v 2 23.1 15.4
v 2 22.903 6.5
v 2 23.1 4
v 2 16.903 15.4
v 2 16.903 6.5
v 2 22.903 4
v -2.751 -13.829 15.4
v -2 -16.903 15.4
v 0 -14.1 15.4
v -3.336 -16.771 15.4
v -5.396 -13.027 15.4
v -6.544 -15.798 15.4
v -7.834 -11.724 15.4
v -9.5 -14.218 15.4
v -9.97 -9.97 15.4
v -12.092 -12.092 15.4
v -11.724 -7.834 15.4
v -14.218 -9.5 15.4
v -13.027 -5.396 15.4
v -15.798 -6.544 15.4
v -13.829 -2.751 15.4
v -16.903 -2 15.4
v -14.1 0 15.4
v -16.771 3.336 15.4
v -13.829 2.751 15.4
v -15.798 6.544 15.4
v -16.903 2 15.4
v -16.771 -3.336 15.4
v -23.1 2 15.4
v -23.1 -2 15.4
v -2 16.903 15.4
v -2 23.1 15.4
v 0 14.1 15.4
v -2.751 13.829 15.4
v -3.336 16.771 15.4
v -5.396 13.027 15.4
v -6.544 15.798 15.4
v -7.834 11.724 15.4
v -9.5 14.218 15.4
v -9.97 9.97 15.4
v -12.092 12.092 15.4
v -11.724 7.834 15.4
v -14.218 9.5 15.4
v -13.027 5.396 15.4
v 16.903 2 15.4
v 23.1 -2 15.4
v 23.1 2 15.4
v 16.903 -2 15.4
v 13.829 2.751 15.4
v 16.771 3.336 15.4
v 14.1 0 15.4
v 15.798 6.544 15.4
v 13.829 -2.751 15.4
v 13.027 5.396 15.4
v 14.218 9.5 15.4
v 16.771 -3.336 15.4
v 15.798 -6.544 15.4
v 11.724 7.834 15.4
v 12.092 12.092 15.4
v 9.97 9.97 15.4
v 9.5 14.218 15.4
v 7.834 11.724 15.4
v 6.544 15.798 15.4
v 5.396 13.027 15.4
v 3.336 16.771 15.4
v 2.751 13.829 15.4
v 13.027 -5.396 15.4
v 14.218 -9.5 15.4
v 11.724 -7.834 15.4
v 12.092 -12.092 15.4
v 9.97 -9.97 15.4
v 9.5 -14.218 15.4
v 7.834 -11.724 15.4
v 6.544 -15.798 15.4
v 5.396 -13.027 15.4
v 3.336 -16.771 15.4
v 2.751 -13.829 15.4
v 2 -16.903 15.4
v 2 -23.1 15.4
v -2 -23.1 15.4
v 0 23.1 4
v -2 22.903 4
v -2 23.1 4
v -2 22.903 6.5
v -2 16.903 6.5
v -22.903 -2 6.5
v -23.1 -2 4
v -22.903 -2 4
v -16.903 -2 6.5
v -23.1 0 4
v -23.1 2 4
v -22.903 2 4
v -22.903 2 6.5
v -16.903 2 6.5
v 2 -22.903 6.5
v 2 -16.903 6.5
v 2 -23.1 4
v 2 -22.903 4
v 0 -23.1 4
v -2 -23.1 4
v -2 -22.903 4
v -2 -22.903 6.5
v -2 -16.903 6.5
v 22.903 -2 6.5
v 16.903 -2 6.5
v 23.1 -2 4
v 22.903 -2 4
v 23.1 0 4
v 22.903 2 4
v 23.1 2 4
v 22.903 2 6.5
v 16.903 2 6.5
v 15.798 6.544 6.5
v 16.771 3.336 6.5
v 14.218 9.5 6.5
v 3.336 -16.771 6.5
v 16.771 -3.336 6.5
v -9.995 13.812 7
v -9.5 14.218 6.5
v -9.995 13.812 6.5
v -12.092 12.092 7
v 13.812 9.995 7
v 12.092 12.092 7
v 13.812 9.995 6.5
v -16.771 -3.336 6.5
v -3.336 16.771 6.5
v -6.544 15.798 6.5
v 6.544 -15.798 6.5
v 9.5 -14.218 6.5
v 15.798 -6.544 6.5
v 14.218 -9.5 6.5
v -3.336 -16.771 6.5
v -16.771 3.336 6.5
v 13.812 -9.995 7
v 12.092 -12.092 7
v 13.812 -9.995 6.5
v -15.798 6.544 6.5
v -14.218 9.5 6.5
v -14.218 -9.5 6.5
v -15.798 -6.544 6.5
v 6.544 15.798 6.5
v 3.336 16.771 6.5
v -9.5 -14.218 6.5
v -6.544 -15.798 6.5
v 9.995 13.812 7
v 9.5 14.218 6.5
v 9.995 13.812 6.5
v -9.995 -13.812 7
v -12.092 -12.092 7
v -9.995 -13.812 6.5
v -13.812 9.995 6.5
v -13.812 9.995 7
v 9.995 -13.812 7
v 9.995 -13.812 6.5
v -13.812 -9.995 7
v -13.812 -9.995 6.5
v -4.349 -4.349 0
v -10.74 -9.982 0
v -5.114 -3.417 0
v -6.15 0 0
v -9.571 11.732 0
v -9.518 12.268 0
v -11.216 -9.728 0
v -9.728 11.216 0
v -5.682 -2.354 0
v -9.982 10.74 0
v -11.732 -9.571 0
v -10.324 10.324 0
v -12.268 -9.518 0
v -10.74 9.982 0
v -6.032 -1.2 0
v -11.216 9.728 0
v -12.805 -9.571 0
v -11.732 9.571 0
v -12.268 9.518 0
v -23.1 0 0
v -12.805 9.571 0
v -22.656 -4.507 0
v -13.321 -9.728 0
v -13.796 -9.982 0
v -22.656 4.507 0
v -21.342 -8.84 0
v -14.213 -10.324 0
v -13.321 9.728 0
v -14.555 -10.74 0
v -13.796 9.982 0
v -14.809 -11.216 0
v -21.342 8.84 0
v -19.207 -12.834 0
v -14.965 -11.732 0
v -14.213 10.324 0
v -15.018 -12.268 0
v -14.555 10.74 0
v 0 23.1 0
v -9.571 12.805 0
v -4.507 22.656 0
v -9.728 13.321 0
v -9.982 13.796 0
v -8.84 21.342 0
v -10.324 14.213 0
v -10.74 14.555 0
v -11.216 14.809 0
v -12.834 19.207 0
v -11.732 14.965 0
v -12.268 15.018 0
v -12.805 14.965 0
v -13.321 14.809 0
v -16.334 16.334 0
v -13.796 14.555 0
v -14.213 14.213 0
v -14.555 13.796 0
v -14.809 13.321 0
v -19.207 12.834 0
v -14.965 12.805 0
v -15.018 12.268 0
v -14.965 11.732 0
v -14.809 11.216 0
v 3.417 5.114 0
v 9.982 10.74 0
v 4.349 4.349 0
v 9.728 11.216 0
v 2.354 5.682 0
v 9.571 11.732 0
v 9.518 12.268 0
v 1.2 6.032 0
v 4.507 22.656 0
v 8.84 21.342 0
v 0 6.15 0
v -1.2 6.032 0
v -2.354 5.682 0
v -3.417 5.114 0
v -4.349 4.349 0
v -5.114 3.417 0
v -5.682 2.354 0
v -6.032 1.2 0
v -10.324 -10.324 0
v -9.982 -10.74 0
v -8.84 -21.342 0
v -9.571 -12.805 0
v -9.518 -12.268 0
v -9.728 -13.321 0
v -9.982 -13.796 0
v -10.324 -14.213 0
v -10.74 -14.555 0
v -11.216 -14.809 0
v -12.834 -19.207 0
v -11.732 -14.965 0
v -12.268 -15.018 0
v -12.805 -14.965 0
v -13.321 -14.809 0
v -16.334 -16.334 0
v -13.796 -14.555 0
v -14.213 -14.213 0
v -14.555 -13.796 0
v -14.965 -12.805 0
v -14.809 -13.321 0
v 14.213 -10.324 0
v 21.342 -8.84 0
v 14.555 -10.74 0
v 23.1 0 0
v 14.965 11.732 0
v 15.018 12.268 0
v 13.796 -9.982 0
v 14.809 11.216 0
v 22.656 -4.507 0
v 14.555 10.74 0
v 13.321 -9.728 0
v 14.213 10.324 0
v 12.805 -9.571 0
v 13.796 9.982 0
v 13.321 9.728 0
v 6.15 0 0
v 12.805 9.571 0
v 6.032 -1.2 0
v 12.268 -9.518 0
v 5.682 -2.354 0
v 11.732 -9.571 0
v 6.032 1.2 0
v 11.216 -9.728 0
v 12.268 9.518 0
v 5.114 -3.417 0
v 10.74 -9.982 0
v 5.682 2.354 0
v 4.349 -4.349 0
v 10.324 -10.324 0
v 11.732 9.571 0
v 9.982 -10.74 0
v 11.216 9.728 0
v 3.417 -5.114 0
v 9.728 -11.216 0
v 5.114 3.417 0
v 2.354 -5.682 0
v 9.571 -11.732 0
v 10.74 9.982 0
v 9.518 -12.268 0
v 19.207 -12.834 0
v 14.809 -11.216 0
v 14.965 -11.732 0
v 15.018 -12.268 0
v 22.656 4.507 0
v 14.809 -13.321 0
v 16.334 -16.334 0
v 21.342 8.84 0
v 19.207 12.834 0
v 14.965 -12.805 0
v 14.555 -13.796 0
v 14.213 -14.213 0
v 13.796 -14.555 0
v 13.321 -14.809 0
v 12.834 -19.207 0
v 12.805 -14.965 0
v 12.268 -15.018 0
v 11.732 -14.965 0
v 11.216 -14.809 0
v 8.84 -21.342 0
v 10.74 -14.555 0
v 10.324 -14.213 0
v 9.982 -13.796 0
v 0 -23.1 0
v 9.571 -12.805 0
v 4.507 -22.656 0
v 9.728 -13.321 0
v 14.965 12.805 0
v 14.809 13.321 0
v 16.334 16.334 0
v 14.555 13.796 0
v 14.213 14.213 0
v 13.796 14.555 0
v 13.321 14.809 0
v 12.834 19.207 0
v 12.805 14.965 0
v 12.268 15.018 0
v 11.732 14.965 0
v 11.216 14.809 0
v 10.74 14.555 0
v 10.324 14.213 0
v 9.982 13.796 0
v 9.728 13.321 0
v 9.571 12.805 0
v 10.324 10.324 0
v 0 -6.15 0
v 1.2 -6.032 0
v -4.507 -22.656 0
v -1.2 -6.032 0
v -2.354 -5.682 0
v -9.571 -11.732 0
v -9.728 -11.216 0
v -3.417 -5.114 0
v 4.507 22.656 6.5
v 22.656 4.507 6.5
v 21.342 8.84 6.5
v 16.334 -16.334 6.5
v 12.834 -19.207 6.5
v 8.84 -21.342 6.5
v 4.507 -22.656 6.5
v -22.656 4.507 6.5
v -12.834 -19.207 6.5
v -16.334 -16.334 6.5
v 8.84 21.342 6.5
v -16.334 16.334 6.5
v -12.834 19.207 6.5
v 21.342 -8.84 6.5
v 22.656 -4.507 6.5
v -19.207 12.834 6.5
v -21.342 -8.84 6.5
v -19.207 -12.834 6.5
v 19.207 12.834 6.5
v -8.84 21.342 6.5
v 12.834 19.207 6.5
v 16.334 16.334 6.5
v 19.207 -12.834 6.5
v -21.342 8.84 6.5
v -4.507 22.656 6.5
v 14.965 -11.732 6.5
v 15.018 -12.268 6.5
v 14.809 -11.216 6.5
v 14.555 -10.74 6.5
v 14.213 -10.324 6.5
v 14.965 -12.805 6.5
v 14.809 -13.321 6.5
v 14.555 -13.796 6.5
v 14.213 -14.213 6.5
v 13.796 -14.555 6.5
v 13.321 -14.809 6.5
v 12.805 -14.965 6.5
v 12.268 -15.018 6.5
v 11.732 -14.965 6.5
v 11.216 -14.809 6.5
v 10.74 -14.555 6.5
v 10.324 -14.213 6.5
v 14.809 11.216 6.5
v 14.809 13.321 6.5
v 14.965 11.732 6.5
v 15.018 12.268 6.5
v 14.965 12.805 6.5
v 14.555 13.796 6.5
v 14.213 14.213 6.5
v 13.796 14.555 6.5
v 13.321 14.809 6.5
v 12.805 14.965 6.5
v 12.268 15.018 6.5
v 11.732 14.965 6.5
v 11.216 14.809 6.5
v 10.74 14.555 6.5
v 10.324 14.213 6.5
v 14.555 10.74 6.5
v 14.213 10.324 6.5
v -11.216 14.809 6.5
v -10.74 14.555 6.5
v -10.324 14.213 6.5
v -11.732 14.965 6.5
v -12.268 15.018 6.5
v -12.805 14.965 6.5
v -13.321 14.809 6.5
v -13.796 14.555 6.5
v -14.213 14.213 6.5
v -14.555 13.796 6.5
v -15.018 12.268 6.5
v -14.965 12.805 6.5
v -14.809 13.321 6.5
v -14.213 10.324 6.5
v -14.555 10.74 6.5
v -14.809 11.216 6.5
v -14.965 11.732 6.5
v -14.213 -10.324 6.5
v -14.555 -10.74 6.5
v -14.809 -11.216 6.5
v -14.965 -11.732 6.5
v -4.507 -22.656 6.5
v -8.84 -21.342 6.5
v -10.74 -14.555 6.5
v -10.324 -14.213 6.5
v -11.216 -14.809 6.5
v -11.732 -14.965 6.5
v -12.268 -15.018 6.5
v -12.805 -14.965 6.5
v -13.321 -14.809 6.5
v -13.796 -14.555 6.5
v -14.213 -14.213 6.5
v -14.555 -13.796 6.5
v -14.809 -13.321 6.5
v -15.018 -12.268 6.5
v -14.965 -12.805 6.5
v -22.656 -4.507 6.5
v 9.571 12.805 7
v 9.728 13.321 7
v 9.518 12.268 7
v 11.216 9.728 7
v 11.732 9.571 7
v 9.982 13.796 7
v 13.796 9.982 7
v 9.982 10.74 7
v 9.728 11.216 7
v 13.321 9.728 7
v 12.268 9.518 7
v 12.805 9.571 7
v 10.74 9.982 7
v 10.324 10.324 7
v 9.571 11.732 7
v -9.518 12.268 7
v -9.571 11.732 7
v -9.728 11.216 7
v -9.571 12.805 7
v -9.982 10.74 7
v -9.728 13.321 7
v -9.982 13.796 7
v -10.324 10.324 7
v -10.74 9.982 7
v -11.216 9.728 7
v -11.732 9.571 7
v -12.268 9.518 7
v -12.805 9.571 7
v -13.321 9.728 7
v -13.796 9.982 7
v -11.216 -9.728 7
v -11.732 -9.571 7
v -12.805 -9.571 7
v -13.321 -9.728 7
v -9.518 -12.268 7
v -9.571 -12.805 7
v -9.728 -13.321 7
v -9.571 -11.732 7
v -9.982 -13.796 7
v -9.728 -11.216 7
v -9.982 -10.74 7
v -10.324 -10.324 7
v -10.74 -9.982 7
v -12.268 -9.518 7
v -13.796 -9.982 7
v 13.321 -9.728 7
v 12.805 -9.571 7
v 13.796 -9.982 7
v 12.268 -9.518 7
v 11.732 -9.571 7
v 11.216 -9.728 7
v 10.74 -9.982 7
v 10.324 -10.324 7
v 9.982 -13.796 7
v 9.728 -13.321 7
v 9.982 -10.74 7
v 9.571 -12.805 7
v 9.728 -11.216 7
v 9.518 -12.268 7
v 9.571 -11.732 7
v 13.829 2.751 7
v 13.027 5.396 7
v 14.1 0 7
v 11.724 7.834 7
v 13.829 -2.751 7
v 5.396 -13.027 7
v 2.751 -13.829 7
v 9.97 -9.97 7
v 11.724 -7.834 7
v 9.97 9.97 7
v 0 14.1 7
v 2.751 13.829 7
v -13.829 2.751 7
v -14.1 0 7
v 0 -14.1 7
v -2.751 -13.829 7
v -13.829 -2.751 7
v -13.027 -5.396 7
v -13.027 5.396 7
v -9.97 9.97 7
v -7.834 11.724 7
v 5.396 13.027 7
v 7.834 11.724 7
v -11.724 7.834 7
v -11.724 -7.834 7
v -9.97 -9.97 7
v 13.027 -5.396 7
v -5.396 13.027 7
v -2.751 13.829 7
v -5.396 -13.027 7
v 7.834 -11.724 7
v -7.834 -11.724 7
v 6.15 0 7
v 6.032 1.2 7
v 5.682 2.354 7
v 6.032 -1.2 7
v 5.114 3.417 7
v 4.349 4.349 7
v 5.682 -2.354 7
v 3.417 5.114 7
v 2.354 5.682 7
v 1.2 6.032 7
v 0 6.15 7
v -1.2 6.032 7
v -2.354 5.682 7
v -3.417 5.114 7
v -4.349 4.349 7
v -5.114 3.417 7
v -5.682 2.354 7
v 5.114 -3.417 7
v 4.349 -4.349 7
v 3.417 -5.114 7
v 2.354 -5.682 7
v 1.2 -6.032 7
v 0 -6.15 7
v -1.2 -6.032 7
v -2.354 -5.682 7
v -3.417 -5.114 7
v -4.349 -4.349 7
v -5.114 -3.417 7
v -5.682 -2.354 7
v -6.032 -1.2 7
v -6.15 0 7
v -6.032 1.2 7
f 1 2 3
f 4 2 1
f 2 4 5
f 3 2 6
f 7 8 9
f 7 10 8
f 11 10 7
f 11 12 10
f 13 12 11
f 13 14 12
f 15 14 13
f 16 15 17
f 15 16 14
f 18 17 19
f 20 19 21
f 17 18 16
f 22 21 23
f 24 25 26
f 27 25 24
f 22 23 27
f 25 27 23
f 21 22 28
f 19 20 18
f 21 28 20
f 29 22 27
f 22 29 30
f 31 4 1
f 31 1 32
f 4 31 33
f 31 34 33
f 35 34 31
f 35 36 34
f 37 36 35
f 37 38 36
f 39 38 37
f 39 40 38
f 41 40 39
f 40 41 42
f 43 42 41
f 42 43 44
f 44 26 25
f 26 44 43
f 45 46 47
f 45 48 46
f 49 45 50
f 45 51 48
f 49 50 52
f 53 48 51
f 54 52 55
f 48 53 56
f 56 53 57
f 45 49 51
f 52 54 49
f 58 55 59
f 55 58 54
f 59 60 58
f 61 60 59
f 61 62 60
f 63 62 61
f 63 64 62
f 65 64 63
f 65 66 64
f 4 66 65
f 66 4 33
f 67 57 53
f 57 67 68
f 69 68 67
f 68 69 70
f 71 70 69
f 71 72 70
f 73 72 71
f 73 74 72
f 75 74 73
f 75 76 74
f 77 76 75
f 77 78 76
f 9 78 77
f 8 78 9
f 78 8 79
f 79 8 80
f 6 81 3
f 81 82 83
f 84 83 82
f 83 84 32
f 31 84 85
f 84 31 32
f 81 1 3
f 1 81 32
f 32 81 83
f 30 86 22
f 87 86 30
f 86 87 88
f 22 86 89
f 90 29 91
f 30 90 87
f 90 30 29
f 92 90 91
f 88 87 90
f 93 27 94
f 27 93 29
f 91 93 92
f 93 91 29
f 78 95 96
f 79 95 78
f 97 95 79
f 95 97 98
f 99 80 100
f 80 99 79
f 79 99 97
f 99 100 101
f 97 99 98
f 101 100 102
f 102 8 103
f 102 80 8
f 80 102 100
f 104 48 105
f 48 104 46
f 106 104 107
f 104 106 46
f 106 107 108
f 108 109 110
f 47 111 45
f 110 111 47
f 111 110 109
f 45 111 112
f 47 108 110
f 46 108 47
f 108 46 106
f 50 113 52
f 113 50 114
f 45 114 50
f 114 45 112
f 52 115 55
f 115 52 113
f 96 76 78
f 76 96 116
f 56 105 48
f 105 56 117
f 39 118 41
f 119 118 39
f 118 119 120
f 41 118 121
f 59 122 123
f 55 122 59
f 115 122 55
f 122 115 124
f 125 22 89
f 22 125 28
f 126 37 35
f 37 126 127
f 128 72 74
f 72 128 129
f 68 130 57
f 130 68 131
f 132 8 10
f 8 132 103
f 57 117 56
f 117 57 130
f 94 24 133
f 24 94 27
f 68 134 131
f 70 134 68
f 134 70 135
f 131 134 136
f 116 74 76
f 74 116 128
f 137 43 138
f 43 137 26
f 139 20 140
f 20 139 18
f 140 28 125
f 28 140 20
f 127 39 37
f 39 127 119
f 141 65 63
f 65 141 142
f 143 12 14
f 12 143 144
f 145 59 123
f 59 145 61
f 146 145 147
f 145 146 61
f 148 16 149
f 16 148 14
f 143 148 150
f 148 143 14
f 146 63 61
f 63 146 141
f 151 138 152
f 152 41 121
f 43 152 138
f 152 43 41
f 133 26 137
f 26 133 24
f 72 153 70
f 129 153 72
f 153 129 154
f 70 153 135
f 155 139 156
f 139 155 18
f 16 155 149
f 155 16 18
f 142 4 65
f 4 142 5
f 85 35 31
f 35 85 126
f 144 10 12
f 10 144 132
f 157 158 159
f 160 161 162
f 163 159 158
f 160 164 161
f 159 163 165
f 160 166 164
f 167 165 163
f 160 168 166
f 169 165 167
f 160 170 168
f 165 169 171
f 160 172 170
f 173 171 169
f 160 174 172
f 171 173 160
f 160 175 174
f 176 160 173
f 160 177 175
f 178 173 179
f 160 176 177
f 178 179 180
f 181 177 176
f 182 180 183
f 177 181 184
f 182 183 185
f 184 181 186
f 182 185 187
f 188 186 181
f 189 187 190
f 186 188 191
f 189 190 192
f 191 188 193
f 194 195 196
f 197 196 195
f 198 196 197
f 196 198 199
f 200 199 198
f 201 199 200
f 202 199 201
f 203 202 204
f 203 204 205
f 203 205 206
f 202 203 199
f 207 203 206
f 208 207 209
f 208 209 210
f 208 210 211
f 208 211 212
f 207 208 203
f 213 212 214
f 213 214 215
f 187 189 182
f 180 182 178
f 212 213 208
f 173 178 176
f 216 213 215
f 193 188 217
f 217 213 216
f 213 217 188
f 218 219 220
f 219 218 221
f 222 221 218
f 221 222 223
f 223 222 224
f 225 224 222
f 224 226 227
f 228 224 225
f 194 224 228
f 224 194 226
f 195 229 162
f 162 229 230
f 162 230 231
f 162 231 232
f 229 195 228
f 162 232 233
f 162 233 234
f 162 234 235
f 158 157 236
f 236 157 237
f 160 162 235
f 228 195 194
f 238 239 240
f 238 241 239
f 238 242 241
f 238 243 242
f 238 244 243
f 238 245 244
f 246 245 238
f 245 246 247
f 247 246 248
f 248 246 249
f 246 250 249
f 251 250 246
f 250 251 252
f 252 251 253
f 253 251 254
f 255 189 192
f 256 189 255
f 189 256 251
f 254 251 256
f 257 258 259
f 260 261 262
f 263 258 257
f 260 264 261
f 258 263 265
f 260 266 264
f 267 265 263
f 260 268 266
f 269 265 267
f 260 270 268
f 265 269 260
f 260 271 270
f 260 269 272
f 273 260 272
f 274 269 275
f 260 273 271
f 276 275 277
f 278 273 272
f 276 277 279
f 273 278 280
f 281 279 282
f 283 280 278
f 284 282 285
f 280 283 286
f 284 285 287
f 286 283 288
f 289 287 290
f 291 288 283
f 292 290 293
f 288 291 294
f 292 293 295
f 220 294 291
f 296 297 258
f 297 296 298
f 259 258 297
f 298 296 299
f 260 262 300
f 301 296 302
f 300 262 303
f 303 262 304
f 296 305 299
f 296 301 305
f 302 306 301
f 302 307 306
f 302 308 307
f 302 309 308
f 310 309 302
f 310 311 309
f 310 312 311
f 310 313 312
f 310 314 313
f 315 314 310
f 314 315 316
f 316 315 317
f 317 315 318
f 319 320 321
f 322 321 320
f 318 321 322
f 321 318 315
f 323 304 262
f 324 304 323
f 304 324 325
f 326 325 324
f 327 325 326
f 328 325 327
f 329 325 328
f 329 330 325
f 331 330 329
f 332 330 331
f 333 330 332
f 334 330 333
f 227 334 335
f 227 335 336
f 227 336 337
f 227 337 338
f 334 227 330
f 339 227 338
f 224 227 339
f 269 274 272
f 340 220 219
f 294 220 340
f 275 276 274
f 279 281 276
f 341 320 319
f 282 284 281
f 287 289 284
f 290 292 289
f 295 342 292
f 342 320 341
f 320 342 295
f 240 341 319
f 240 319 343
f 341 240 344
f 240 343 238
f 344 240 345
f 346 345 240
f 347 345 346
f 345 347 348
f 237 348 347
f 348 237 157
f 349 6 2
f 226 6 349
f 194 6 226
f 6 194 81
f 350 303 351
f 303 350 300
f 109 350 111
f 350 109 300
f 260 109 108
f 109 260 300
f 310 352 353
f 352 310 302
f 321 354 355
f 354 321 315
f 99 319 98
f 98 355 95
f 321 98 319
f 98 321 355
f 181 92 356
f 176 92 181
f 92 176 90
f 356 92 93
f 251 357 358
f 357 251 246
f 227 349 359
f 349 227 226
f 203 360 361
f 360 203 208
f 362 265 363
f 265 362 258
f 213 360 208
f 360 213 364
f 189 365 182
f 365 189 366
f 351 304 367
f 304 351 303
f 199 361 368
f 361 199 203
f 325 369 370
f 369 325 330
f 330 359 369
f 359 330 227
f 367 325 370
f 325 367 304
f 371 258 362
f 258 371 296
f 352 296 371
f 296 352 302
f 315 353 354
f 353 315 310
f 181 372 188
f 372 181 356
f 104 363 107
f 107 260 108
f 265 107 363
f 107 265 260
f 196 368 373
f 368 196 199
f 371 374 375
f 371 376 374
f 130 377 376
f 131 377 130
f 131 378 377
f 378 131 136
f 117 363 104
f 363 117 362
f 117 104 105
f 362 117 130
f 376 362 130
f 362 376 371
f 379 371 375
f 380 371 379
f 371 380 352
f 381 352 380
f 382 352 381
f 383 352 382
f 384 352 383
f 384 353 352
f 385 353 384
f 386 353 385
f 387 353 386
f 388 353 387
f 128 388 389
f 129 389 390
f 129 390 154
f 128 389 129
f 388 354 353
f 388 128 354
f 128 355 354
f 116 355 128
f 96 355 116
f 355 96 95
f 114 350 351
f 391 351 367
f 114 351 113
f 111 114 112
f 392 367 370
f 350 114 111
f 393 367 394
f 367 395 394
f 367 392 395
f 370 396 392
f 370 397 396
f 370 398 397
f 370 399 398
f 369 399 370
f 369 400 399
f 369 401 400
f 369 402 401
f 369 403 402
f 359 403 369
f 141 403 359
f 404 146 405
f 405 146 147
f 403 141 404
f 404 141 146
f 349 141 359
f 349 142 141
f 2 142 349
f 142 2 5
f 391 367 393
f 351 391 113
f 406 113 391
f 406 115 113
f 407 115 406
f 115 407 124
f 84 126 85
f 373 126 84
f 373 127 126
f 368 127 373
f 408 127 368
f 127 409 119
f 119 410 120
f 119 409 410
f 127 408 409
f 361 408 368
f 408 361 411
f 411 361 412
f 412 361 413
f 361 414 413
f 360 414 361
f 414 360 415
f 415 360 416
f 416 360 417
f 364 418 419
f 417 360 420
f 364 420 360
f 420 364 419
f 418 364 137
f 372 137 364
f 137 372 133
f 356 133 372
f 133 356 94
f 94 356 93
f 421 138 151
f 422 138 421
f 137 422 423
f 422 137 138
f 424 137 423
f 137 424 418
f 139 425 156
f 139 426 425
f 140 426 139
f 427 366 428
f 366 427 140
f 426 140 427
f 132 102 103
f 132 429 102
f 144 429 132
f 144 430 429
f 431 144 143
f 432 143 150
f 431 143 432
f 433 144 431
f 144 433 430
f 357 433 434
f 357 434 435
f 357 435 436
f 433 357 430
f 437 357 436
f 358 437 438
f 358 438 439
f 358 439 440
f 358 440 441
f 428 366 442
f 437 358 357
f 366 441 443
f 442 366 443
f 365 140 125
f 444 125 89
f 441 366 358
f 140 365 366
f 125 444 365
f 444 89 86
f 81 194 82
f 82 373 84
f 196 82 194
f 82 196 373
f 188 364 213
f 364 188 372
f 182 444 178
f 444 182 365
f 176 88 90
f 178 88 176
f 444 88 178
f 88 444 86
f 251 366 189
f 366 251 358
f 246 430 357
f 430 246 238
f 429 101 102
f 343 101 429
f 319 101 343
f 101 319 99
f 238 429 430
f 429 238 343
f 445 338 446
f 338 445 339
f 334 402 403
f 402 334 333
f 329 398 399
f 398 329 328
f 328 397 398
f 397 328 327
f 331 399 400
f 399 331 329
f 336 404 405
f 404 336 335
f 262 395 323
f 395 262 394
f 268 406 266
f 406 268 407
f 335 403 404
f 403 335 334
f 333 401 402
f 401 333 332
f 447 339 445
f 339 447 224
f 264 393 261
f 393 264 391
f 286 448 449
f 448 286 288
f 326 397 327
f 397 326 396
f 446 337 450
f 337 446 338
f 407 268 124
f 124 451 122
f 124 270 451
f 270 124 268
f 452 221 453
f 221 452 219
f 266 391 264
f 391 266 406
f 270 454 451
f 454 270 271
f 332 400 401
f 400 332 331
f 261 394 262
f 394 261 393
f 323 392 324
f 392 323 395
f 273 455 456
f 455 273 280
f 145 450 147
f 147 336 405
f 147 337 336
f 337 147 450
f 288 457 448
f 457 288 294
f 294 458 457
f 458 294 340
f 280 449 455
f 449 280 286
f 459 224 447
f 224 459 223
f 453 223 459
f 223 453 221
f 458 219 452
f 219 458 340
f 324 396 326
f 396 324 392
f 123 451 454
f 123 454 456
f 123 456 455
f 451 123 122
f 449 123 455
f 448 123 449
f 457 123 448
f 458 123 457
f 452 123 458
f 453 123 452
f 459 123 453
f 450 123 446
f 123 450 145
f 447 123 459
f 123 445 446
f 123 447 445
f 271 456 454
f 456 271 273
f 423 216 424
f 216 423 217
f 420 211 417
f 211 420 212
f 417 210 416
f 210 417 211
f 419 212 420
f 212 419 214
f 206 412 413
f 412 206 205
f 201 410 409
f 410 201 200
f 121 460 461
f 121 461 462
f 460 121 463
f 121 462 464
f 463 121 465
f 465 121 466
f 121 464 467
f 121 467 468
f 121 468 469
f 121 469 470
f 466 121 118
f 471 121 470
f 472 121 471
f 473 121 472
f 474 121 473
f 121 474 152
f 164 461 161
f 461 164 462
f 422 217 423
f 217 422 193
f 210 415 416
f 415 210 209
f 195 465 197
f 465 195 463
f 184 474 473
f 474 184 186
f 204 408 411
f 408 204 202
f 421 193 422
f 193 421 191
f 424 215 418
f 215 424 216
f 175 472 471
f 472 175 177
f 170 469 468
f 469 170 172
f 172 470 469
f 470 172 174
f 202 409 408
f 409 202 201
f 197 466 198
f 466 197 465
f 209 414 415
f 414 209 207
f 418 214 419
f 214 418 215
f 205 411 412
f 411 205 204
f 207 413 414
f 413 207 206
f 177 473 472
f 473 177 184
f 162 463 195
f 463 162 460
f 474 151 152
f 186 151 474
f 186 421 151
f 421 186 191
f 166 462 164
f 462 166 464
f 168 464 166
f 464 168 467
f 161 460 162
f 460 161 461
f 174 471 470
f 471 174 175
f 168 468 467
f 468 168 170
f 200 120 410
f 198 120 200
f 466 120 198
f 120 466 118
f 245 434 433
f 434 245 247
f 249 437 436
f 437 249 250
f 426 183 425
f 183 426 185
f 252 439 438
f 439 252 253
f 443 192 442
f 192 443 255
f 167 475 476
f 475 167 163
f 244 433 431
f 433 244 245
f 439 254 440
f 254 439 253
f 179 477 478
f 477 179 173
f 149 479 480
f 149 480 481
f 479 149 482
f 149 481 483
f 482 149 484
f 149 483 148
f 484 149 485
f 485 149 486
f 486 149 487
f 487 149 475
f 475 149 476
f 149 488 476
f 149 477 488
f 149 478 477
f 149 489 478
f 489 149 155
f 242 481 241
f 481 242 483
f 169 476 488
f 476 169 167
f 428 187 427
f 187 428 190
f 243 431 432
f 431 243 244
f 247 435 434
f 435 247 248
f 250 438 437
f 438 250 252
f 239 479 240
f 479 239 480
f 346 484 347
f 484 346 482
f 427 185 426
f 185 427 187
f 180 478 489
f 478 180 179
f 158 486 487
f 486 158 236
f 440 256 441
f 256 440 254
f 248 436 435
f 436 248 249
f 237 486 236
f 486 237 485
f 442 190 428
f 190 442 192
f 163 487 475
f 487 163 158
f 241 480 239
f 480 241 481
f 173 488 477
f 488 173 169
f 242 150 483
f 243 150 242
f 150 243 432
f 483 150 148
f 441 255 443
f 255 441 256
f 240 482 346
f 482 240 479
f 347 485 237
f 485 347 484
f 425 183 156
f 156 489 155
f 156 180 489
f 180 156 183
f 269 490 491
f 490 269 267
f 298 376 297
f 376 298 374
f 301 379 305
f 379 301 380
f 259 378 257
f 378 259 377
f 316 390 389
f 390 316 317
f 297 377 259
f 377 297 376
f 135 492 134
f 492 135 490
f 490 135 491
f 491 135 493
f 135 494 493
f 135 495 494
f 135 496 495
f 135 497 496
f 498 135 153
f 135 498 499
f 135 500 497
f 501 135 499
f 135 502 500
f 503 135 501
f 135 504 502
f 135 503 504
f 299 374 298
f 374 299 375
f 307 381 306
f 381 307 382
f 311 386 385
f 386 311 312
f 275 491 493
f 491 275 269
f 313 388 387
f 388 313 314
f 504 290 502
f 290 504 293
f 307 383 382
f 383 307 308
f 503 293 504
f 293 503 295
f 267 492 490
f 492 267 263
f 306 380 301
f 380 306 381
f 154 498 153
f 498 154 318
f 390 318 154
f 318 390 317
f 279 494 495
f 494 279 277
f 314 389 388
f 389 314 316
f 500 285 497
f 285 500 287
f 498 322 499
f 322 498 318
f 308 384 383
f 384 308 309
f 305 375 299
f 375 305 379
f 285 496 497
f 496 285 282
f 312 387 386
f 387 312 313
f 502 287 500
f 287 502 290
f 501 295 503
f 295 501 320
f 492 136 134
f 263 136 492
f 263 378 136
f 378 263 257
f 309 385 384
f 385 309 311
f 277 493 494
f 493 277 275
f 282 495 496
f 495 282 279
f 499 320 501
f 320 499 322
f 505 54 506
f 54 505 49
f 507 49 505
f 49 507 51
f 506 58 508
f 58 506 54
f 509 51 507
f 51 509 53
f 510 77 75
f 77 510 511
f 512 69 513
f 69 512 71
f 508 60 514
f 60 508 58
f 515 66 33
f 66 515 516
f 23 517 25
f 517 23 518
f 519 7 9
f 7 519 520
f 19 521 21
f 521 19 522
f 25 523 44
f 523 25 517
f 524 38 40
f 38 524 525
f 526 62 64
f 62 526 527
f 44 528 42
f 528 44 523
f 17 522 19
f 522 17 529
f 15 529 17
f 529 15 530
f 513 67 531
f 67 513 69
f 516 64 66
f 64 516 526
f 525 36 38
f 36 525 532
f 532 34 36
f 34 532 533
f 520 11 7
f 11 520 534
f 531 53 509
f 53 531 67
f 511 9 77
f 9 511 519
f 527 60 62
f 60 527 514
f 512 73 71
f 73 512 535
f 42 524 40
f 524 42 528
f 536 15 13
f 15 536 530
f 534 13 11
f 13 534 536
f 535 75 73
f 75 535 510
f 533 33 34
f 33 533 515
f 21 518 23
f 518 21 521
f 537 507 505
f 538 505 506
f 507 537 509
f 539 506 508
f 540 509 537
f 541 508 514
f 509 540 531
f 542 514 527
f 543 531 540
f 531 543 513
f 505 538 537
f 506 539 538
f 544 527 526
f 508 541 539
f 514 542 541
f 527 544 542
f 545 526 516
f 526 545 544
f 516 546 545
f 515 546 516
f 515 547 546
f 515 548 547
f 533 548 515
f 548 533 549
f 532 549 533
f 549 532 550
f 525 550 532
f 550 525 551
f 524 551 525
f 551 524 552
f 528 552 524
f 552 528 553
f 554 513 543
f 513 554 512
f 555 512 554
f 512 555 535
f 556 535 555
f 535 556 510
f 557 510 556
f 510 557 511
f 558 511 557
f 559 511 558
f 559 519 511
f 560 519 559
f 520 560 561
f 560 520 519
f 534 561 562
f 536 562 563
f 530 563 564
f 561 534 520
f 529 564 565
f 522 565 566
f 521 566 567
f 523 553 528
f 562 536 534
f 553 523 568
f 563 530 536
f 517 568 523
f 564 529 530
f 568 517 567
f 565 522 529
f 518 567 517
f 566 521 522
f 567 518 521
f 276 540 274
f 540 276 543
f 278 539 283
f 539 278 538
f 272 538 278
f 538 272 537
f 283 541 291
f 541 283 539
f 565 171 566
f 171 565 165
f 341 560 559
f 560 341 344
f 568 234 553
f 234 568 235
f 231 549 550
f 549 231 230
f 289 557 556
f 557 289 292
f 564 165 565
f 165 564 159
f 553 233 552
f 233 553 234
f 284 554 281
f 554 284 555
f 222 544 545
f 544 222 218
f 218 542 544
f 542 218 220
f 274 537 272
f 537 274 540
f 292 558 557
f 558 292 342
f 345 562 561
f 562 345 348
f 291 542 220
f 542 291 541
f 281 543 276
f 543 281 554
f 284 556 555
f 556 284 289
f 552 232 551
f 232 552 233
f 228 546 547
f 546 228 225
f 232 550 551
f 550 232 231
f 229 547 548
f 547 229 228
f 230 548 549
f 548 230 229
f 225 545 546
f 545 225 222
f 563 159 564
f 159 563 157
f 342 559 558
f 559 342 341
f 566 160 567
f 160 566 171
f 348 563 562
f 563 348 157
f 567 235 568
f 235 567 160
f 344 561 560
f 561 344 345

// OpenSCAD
$fn = 32;

// ----------------------------------------------------------------------
// Bearing housing: seat for 6001 (28 x 8 mm), 34.2 mm body
// ----------------------------------------------------------------------

// --- parameters (mm) ---
body_od = 34.2;           // housing outside diameter
body_h = 15.4;            // overall housing height
wall = 3;                 // wall thickness
pocket_d = 28.2;          // 6001 seat, 0.2 mm clearance
seat_h = 8.4;             // pocket depth
shoulder = 2;             // shoulder under the bearing
pass_d = 12.3;            // shaft passage
flange_dia = 46.2;        // mounting flange diameter
flange_t = 5;             // flange thickness
bolt_d = 5.5;             // flange bolt clearance
bolt_r = 17.35;           // flange bolt circle radius
rib_w = 4;                // rib width
rib_n = 4;                // rib count

module body() {
  cylinder(h = body_h, d = body_od);
}

module flange() {
  /* flange sunk 1.5 mm into the body */
  cylinder(h = flange_t + 1.5, d = flange_dia);
}

module ribs() {
  for (i = [0 : rib_n - 1])
    rotate([0, 0, i * 360 / rib_n])
      translate([-rib_w / 2, body_od / 2 - 0.8, flange_t - 1])
        cube([rib_w, (flange_dia - body_od) / 2 + 0.8, body_h - flange_t + 1]);
}

difference() {
  union() {
    body();
    flange();
    ribs();
  }
  translate([0, 0, body_h - seat_h]) cylinder(h = seat_h + 1, d = pocket_d);
  translate([0, 0, -1]) cylinder(h = body_h - seat_h + 1, d = pass_d);
  for (i = [0 : 3]) rotate([0, 0, 45 + i * 90]) translate([bolt_r, 0, -1])
    cylinder(h = flange_t + 3, d = bolt_d);
}
